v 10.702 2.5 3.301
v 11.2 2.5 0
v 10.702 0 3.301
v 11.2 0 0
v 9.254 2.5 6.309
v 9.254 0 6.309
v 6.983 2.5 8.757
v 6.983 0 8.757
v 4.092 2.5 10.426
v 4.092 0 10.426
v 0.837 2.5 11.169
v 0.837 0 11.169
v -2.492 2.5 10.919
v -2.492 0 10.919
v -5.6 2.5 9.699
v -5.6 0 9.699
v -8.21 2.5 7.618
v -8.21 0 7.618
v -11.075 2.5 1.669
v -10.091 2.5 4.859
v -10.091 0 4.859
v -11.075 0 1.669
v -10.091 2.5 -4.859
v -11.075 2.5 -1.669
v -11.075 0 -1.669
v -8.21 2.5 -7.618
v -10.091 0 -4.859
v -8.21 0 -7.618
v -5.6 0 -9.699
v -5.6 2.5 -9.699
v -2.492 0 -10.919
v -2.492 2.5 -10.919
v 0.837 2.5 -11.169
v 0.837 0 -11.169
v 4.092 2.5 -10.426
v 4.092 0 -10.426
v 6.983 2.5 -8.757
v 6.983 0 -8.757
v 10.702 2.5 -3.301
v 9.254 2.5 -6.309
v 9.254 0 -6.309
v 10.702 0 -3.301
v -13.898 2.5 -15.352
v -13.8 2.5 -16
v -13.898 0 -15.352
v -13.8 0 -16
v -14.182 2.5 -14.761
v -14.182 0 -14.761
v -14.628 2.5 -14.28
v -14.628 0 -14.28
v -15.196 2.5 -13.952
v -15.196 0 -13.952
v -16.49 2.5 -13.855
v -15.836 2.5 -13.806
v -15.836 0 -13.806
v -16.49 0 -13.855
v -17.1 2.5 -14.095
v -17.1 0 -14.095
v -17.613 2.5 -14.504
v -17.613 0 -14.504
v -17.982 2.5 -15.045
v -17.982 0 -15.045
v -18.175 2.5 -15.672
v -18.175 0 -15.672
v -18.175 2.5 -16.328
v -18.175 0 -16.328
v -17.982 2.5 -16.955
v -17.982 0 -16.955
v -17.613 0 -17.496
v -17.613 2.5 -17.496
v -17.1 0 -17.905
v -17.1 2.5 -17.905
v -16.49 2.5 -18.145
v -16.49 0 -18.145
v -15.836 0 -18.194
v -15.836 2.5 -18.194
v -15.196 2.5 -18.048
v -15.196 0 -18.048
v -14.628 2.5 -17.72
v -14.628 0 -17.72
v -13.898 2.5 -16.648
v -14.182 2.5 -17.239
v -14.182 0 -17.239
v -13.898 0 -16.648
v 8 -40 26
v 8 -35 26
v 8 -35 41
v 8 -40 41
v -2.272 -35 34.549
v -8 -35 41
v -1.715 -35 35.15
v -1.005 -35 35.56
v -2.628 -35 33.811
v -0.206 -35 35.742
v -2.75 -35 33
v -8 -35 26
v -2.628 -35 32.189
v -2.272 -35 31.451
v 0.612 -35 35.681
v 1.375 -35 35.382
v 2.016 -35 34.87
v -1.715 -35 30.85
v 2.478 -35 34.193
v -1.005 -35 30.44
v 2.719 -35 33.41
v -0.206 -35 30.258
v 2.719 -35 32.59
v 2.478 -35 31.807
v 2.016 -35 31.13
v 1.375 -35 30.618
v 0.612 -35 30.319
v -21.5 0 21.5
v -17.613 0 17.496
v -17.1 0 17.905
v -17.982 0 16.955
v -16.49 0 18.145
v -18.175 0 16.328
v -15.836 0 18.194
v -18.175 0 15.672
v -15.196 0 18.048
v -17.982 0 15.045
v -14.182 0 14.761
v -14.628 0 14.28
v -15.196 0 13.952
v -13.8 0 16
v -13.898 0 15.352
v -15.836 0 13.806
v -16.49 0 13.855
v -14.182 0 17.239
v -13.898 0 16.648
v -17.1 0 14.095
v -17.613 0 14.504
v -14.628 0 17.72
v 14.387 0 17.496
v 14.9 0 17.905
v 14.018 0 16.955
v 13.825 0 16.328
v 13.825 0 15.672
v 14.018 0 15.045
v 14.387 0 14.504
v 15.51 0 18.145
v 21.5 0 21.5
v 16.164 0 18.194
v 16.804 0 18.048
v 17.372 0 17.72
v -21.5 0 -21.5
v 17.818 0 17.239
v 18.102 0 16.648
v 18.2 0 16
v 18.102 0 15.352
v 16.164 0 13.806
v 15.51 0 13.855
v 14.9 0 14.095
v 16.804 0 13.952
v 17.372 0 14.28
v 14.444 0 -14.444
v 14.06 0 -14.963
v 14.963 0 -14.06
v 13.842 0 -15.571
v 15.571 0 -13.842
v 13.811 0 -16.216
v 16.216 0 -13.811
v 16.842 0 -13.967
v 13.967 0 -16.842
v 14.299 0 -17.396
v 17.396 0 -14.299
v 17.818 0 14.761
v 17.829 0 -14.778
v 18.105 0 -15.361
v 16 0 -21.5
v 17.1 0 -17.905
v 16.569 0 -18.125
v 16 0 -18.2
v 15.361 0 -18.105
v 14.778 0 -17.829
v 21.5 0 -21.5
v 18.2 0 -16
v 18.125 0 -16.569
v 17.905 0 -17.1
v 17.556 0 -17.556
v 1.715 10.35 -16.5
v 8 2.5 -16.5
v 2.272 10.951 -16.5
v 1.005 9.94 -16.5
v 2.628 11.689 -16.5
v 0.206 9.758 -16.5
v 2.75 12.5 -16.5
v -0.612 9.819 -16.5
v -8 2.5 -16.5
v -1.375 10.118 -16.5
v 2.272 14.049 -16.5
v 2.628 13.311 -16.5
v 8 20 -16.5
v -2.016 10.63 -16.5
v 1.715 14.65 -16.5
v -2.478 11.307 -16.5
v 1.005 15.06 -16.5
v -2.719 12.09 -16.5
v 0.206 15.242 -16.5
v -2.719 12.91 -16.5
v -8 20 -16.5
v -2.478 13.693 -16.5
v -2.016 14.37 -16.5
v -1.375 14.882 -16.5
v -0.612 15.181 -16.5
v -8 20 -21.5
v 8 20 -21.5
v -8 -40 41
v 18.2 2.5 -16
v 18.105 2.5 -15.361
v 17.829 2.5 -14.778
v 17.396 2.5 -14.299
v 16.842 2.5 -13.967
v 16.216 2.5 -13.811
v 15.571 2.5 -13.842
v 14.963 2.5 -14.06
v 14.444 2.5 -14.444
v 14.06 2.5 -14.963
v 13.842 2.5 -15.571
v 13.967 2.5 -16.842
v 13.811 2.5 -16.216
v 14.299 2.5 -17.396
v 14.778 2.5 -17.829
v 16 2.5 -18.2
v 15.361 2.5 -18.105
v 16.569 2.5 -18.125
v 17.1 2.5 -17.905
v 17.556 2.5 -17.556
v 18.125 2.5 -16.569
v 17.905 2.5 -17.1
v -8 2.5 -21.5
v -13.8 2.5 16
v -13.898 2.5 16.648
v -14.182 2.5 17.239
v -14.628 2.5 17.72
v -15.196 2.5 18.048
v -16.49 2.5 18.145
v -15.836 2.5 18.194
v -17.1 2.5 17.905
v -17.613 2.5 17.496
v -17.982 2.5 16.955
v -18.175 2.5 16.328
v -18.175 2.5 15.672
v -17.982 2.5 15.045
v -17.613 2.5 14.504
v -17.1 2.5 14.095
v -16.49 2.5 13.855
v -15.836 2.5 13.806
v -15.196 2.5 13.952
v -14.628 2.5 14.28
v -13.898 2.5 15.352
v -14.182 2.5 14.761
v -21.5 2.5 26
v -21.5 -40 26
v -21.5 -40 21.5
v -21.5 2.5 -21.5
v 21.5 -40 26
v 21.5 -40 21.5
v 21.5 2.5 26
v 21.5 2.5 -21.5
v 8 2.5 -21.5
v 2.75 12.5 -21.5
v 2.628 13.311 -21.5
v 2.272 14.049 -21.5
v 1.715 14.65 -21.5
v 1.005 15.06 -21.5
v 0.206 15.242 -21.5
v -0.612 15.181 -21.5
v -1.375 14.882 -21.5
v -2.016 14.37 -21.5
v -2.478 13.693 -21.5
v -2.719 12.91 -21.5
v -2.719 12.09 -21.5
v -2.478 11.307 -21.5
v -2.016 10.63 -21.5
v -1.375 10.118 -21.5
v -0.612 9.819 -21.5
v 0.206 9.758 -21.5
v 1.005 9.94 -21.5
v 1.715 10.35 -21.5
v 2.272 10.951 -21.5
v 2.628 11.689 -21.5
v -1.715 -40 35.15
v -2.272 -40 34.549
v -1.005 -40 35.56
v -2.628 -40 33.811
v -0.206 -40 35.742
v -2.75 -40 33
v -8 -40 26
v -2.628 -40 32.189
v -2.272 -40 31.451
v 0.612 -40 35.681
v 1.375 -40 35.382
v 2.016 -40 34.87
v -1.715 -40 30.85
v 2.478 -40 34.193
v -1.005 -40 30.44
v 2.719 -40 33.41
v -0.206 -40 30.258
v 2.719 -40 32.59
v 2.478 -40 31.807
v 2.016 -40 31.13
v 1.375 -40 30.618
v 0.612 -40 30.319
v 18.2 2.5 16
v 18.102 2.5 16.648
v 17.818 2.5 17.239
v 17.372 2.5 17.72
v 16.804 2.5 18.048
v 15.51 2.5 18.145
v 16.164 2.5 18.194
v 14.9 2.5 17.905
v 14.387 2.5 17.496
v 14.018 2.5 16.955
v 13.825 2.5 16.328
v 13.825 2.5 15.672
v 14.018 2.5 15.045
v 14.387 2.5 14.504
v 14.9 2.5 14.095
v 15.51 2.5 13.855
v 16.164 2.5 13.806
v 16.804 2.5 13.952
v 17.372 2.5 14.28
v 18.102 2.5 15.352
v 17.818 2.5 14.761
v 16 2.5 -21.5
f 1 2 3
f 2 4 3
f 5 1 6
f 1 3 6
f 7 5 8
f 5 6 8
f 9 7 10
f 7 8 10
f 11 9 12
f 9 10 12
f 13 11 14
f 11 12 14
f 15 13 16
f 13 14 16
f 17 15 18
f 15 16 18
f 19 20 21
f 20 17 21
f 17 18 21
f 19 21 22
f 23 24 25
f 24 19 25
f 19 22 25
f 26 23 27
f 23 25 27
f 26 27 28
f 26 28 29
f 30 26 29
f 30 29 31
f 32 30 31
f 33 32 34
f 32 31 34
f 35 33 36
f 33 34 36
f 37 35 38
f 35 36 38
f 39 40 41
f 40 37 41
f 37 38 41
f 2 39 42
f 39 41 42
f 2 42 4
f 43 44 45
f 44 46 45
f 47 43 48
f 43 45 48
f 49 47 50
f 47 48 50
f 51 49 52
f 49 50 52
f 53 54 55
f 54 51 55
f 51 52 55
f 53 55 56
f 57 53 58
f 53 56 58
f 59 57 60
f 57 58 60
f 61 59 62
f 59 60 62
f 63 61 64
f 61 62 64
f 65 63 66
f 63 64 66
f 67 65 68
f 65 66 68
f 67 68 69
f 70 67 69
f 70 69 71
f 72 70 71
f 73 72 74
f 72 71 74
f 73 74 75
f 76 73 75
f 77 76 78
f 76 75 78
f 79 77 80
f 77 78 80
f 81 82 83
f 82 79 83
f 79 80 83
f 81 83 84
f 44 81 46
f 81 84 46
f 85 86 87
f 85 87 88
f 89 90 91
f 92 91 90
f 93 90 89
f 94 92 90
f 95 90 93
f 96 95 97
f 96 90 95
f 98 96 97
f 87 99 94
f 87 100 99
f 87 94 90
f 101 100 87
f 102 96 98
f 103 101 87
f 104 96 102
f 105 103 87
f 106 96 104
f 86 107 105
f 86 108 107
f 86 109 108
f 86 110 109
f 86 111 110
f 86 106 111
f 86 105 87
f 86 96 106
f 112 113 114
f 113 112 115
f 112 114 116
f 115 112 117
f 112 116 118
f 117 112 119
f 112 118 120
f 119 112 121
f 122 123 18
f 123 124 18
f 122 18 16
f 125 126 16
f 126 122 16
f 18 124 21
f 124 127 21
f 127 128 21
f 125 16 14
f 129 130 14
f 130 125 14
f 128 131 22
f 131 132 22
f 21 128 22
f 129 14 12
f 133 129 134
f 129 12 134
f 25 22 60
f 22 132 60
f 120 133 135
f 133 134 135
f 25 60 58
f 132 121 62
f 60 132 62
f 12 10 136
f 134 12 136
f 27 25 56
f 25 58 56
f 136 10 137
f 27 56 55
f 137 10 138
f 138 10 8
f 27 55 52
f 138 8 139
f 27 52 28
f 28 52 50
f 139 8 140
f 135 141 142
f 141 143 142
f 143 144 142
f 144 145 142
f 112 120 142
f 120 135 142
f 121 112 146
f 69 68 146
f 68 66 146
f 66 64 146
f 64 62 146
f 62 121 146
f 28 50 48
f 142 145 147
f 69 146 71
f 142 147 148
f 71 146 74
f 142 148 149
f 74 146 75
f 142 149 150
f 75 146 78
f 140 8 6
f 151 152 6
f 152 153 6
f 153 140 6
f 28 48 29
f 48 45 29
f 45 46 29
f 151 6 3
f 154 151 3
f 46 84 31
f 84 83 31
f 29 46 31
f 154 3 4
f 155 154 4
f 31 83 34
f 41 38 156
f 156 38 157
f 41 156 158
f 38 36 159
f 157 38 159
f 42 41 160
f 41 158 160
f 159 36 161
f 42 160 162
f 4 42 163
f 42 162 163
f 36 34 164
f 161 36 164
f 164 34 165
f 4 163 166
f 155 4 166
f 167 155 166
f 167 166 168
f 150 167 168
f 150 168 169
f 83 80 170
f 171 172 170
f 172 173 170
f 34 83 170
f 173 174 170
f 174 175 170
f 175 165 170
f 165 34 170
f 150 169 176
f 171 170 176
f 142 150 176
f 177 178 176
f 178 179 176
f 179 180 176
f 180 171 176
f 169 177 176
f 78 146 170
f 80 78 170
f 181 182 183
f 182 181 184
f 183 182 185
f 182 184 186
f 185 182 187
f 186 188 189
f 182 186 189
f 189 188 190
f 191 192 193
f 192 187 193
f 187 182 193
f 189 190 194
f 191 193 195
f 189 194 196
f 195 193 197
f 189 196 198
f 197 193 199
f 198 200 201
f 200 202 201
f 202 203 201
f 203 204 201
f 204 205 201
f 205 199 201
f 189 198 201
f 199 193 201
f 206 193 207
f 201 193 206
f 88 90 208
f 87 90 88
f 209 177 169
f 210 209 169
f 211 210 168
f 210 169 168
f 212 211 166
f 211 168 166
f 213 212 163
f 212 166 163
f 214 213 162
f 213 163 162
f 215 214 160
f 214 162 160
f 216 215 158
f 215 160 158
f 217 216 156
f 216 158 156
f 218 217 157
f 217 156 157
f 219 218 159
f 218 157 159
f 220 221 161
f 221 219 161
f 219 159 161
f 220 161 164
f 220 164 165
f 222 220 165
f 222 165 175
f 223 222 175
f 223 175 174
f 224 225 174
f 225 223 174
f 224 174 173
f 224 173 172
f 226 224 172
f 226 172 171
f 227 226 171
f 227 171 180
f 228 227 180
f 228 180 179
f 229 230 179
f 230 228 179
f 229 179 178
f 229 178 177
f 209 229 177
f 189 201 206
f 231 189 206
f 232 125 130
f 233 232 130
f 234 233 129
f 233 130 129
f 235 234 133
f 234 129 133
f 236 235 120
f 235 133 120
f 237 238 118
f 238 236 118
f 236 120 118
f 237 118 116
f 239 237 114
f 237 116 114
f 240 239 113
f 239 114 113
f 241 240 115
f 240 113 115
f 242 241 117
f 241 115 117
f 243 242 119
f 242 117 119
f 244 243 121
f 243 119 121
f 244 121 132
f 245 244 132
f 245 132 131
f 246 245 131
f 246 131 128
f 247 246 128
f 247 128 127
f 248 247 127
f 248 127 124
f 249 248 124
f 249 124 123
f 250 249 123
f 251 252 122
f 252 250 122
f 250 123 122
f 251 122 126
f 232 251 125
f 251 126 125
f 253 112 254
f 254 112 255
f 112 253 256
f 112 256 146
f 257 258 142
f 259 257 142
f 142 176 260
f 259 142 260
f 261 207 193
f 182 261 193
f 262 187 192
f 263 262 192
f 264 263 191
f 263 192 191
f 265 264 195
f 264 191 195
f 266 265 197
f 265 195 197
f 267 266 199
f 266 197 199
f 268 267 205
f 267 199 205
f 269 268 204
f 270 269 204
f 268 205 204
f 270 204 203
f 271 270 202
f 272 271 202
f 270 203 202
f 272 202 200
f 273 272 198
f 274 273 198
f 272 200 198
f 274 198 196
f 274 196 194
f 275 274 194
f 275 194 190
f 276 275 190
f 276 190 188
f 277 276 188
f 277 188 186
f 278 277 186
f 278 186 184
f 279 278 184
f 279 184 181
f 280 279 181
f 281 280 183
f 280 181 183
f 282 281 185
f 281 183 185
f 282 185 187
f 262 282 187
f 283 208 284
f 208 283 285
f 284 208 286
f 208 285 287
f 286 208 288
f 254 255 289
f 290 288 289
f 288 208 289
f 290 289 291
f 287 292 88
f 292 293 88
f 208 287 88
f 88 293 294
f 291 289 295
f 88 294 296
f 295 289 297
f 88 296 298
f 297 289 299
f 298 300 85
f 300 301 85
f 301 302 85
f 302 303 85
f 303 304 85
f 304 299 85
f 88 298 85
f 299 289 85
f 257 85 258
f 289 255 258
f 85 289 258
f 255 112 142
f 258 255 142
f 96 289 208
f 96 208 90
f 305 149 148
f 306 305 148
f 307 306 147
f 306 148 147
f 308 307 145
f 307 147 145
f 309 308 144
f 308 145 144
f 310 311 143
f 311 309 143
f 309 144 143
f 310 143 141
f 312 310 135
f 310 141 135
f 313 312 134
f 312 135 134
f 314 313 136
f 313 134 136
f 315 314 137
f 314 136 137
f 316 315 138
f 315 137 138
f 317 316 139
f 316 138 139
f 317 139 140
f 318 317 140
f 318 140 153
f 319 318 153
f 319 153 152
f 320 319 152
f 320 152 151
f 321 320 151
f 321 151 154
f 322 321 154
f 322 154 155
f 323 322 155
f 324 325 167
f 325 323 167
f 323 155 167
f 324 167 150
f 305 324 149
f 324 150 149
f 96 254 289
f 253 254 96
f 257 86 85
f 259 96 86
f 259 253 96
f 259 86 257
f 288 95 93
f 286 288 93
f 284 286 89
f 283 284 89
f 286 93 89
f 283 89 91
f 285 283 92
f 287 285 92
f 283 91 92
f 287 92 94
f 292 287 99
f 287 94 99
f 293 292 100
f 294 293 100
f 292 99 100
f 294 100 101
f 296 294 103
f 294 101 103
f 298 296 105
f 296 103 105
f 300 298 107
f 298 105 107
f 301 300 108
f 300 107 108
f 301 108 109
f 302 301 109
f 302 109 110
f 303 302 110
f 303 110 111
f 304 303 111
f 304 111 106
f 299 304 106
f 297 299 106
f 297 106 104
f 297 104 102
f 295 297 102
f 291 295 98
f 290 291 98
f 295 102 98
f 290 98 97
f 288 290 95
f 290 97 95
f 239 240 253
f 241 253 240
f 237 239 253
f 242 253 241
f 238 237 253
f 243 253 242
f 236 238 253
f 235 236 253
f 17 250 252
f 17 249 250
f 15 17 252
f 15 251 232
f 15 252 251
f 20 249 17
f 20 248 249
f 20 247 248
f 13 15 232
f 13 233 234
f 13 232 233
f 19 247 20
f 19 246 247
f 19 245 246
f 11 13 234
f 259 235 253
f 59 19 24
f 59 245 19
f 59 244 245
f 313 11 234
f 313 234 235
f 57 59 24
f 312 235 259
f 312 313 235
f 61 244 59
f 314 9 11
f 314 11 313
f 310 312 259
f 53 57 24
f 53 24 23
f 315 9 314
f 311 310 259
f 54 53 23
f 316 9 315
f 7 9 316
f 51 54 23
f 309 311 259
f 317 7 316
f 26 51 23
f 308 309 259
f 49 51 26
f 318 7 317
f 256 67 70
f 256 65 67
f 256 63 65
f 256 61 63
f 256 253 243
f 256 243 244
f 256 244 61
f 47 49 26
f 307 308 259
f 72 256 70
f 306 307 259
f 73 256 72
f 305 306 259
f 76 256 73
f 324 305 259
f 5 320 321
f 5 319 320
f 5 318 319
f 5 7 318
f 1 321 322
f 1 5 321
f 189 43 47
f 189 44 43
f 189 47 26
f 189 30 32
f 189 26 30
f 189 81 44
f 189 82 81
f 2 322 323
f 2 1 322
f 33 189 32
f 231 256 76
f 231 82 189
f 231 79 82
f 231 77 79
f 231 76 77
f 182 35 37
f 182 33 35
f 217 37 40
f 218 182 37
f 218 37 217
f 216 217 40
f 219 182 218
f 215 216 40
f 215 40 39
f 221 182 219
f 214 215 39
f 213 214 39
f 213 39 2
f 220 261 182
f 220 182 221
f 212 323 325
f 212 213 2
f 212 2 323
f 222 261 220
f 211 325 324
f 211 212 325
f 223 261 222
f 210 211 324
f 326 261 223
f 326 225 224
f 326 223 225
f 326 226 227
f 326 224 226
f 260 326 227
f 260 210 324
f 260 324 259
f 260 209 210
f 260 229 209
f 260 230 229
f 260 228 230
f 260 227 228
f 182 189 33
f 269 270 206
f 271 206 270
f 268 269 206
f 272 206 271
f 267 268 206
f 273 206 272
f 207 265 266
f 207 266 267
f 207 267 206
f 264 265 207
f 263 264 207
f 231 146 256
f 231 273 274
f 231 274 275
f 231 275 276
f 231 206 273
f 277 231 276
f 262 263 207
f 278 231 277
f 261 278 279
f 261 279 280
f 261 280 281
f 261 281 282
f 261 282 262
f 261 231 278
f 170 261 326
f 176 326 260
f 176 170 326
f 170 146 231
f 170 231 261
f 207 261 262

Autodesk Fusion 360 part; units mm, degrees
sketch "Sketch1" plane through (0, 0, 0) normal (0, 1, 0) x (1, 0, 0)
  circle A0 centre (0, 0) radius 11.2
  line L0 (21.5, 21.5) -> (-21.5, 21.5)
  line L1 (-21.5, 21.5) -> (-21.5, -21.5)
  line L2 (-21.5, -21.5) -> (21.5, -21.5)
  line L3 (21.5, -21.5) -> (21.5, 21.5)
  line L4 (21.5, 21.5) -> (-21.5, -21.5) construction
  line L5 (-21.5, 21.5) -> (21.5, -21.5) construction
  line L6 (21.5, 21.5) -> (16, 21.5)
  line L7 (16, 21.5) -> (16, 16)
  circle A1 centre (16, 16) radius 2.2
  circle A2 centre (-16, 16) radius 2.2
  circle A3 centre (-16, -16) radius 2.2
  circle A4 centre (16, -16) radius 2.2
  line L8 (26, 26) -> (-26, 26)
  line L9 (-26, 26) -> (-26, -26)
  line L10 (-26, -26) -> (26, -26)
  line L11 (26, -26) -> (26, 26)
  line L12 (26, 26) -> (-26, -26) construction
  line L13 (-26, 26) -> (26, -26) construction
  line L14 (-21.5, -21.5) -> (-26, -21.5)
  line L15 (21.5, -21.5) -> (26, -21.5)
  line L16 (-21.5, 21.5) -> (-26, 21.5)
  line L17 (21.5, 21.5) -> (26, 21.5)
  dimension "d1" = 22.4
  dimension "d2" = 43
  dimension "d3" = 43
  dimension "d4" = 5.5
  dimension "d5" = 5.5
  dimension "d6" = 4.4
  dimension "d8" = 360
  dimension "d9" = 52
  dimension "d10" = 52
extrude "Extrude1" add sketch "Sketch1" along normal blind 5
extrude "Extrude7" add sketch "Sketch1" against normal blind 40 contours L2 L9 L10 L11 L14 L15
extrude "Extrude8" cut sketch "Sketch1" along normal blind 32 contours L0 L6 L8 L9 L11 L16 L17
sketch "Sketch7" plane through (0, 5, 0) normal (0, 1, 0) x (-1, 0, 0)
  line L0 (-26, -21.5) -> (26, -21.5)
  line L1 (26, -21.5) -> (26, 26)
  line L2 (26, 26) -> (-26, 26)
  line L3 (-26, 26) -> (-26, -21.5)
  circle A0 centre (16, 16) radius 2.2
  circle A1 centre (-16, 16) radius 2.2
  circle A2 centre (16, -16) radius 2.2
  circle A3 centre (0, 0) radius 11.2
  circle A4 centre (-16, -16) radius 2.2
  line L4 (0, -21.5) -> (8, -21.5)
  line L5 (8, -21.5) -> (-8, -21.5)
  line L6 (-8, -21.5) -> (-8, -16.5)
  line L7 (-8, -16.5) -> (8, -16.5)
  line L8 (8, -16.5) -> (8, -21.5)
  dimension "d48" = 8
  dimension "d49" = 16
  dimension "d50" = 5
extrude "Extrude9" add sketch "Sketch7" along normal blind 15 contours L0 L4 L5 L6 L7 L8
sketch "Sketch8" plane through (0, 0, -16.5) normal (0, 0, 1) x (1, 0, 0)
  line L0 (-8, 5) -> (8, 5)
  line L1 (8, 5) -> (8, 20)
  line L2 (8, 20) -> (-8, 20)
  line L3 (-8, 20) -> (-8, 5)
  line L4 (0, 20) -> (0, 12.5)
  circle A0 centre (0, 12.5) radius 2.75
  dimension "d53" = 5.5
extrude "Extrude10" cut sketch "Sketch8" against normal blind 14 contours A0
sketch "Sketch9" plane through (0, 0, 26) normal (0, 0, 1) x (1, 0, 0)
  line L0 (26, -40) -> (26, 5)
  line L1 (26, 5) -> (-26, 5)
  line L2 (-26, 5) -> (-26, -40)
  line L3 (-26, -40) -> (26, -40)
  line L4 (0, -40) -> (8, -40)
  line L5 (8, -40) -> (-8, -40)
  line L6 (-8, -40) -> (-8, -35)
  line L7 (-8, -35) -> (8, -35)
  line L8 (8, -35) -> (8, -40)
  dimension "d56" = 8
  dimension "d57" = 16
  dimension "d58" = 5
extrude "Extrude11" add sketch "Sketch9" along normal blind 15 contours L3 L4 L5 L6 L7 L8
sketch "Sketch10" plane through (0, -35, 0) normal (0, 1, 0) x (-1, 0, 0)
  line L0 (-8, 26) -> (8, 26)
  line L1 (8, 26) -> (8, 41)
  line L2 (8, 41) -> (-8, 41)
  line L3 (-8, 41) -> (-8, 26)
  line L4 (0, 41) -> (0, 33)
  circle A0 centre (0, 33) radius 2.75
  dimension "d61" = 5.5
extrude "Extrude12" cut sketch "Sketch10" against normal blind 11 contours A0
extrude "Extrude13" cut sketch "Sketch1" along normal blind 6 contours L3 L11 L15 L17 | L1 L9 L14 L16
sketch "Sketch11" plane through (0, 0, 21.5) normal (0, 0, -1) x (-1, 0, 0)
  line L0 (-26, 5) -> (-26, -40)
  line L1 (-26, -40) -> (26, -40)
  line L2 (26, -40) -> (26, 5)
  line L3 (26, 5) -> (21.5, 5)
  line L4 (21.5, 5) -> (21.5, 0)
  line L5 (21.5, 0) -> (-21.5, 0)
  line L6 (-21.5, 0) -> (-21.5, 5)
  line L7 (-21.5, 5) -> (-26, 5)
  line L8 (21.5, 0) -> (21.5, -40)
  line L9 (-21.5, 0) -> (-21.5, -40)
extrude "Extrude14" cut sketch "Sketch11" against normal blind 15 contours L0 L1 L6 L7 L9 | L1 L2 L3 L4 L8
extrude "Extrude15" cut 1 faces at (4.8761, 5, 23.24) along direction (0, -1, 0) blind 2.5
